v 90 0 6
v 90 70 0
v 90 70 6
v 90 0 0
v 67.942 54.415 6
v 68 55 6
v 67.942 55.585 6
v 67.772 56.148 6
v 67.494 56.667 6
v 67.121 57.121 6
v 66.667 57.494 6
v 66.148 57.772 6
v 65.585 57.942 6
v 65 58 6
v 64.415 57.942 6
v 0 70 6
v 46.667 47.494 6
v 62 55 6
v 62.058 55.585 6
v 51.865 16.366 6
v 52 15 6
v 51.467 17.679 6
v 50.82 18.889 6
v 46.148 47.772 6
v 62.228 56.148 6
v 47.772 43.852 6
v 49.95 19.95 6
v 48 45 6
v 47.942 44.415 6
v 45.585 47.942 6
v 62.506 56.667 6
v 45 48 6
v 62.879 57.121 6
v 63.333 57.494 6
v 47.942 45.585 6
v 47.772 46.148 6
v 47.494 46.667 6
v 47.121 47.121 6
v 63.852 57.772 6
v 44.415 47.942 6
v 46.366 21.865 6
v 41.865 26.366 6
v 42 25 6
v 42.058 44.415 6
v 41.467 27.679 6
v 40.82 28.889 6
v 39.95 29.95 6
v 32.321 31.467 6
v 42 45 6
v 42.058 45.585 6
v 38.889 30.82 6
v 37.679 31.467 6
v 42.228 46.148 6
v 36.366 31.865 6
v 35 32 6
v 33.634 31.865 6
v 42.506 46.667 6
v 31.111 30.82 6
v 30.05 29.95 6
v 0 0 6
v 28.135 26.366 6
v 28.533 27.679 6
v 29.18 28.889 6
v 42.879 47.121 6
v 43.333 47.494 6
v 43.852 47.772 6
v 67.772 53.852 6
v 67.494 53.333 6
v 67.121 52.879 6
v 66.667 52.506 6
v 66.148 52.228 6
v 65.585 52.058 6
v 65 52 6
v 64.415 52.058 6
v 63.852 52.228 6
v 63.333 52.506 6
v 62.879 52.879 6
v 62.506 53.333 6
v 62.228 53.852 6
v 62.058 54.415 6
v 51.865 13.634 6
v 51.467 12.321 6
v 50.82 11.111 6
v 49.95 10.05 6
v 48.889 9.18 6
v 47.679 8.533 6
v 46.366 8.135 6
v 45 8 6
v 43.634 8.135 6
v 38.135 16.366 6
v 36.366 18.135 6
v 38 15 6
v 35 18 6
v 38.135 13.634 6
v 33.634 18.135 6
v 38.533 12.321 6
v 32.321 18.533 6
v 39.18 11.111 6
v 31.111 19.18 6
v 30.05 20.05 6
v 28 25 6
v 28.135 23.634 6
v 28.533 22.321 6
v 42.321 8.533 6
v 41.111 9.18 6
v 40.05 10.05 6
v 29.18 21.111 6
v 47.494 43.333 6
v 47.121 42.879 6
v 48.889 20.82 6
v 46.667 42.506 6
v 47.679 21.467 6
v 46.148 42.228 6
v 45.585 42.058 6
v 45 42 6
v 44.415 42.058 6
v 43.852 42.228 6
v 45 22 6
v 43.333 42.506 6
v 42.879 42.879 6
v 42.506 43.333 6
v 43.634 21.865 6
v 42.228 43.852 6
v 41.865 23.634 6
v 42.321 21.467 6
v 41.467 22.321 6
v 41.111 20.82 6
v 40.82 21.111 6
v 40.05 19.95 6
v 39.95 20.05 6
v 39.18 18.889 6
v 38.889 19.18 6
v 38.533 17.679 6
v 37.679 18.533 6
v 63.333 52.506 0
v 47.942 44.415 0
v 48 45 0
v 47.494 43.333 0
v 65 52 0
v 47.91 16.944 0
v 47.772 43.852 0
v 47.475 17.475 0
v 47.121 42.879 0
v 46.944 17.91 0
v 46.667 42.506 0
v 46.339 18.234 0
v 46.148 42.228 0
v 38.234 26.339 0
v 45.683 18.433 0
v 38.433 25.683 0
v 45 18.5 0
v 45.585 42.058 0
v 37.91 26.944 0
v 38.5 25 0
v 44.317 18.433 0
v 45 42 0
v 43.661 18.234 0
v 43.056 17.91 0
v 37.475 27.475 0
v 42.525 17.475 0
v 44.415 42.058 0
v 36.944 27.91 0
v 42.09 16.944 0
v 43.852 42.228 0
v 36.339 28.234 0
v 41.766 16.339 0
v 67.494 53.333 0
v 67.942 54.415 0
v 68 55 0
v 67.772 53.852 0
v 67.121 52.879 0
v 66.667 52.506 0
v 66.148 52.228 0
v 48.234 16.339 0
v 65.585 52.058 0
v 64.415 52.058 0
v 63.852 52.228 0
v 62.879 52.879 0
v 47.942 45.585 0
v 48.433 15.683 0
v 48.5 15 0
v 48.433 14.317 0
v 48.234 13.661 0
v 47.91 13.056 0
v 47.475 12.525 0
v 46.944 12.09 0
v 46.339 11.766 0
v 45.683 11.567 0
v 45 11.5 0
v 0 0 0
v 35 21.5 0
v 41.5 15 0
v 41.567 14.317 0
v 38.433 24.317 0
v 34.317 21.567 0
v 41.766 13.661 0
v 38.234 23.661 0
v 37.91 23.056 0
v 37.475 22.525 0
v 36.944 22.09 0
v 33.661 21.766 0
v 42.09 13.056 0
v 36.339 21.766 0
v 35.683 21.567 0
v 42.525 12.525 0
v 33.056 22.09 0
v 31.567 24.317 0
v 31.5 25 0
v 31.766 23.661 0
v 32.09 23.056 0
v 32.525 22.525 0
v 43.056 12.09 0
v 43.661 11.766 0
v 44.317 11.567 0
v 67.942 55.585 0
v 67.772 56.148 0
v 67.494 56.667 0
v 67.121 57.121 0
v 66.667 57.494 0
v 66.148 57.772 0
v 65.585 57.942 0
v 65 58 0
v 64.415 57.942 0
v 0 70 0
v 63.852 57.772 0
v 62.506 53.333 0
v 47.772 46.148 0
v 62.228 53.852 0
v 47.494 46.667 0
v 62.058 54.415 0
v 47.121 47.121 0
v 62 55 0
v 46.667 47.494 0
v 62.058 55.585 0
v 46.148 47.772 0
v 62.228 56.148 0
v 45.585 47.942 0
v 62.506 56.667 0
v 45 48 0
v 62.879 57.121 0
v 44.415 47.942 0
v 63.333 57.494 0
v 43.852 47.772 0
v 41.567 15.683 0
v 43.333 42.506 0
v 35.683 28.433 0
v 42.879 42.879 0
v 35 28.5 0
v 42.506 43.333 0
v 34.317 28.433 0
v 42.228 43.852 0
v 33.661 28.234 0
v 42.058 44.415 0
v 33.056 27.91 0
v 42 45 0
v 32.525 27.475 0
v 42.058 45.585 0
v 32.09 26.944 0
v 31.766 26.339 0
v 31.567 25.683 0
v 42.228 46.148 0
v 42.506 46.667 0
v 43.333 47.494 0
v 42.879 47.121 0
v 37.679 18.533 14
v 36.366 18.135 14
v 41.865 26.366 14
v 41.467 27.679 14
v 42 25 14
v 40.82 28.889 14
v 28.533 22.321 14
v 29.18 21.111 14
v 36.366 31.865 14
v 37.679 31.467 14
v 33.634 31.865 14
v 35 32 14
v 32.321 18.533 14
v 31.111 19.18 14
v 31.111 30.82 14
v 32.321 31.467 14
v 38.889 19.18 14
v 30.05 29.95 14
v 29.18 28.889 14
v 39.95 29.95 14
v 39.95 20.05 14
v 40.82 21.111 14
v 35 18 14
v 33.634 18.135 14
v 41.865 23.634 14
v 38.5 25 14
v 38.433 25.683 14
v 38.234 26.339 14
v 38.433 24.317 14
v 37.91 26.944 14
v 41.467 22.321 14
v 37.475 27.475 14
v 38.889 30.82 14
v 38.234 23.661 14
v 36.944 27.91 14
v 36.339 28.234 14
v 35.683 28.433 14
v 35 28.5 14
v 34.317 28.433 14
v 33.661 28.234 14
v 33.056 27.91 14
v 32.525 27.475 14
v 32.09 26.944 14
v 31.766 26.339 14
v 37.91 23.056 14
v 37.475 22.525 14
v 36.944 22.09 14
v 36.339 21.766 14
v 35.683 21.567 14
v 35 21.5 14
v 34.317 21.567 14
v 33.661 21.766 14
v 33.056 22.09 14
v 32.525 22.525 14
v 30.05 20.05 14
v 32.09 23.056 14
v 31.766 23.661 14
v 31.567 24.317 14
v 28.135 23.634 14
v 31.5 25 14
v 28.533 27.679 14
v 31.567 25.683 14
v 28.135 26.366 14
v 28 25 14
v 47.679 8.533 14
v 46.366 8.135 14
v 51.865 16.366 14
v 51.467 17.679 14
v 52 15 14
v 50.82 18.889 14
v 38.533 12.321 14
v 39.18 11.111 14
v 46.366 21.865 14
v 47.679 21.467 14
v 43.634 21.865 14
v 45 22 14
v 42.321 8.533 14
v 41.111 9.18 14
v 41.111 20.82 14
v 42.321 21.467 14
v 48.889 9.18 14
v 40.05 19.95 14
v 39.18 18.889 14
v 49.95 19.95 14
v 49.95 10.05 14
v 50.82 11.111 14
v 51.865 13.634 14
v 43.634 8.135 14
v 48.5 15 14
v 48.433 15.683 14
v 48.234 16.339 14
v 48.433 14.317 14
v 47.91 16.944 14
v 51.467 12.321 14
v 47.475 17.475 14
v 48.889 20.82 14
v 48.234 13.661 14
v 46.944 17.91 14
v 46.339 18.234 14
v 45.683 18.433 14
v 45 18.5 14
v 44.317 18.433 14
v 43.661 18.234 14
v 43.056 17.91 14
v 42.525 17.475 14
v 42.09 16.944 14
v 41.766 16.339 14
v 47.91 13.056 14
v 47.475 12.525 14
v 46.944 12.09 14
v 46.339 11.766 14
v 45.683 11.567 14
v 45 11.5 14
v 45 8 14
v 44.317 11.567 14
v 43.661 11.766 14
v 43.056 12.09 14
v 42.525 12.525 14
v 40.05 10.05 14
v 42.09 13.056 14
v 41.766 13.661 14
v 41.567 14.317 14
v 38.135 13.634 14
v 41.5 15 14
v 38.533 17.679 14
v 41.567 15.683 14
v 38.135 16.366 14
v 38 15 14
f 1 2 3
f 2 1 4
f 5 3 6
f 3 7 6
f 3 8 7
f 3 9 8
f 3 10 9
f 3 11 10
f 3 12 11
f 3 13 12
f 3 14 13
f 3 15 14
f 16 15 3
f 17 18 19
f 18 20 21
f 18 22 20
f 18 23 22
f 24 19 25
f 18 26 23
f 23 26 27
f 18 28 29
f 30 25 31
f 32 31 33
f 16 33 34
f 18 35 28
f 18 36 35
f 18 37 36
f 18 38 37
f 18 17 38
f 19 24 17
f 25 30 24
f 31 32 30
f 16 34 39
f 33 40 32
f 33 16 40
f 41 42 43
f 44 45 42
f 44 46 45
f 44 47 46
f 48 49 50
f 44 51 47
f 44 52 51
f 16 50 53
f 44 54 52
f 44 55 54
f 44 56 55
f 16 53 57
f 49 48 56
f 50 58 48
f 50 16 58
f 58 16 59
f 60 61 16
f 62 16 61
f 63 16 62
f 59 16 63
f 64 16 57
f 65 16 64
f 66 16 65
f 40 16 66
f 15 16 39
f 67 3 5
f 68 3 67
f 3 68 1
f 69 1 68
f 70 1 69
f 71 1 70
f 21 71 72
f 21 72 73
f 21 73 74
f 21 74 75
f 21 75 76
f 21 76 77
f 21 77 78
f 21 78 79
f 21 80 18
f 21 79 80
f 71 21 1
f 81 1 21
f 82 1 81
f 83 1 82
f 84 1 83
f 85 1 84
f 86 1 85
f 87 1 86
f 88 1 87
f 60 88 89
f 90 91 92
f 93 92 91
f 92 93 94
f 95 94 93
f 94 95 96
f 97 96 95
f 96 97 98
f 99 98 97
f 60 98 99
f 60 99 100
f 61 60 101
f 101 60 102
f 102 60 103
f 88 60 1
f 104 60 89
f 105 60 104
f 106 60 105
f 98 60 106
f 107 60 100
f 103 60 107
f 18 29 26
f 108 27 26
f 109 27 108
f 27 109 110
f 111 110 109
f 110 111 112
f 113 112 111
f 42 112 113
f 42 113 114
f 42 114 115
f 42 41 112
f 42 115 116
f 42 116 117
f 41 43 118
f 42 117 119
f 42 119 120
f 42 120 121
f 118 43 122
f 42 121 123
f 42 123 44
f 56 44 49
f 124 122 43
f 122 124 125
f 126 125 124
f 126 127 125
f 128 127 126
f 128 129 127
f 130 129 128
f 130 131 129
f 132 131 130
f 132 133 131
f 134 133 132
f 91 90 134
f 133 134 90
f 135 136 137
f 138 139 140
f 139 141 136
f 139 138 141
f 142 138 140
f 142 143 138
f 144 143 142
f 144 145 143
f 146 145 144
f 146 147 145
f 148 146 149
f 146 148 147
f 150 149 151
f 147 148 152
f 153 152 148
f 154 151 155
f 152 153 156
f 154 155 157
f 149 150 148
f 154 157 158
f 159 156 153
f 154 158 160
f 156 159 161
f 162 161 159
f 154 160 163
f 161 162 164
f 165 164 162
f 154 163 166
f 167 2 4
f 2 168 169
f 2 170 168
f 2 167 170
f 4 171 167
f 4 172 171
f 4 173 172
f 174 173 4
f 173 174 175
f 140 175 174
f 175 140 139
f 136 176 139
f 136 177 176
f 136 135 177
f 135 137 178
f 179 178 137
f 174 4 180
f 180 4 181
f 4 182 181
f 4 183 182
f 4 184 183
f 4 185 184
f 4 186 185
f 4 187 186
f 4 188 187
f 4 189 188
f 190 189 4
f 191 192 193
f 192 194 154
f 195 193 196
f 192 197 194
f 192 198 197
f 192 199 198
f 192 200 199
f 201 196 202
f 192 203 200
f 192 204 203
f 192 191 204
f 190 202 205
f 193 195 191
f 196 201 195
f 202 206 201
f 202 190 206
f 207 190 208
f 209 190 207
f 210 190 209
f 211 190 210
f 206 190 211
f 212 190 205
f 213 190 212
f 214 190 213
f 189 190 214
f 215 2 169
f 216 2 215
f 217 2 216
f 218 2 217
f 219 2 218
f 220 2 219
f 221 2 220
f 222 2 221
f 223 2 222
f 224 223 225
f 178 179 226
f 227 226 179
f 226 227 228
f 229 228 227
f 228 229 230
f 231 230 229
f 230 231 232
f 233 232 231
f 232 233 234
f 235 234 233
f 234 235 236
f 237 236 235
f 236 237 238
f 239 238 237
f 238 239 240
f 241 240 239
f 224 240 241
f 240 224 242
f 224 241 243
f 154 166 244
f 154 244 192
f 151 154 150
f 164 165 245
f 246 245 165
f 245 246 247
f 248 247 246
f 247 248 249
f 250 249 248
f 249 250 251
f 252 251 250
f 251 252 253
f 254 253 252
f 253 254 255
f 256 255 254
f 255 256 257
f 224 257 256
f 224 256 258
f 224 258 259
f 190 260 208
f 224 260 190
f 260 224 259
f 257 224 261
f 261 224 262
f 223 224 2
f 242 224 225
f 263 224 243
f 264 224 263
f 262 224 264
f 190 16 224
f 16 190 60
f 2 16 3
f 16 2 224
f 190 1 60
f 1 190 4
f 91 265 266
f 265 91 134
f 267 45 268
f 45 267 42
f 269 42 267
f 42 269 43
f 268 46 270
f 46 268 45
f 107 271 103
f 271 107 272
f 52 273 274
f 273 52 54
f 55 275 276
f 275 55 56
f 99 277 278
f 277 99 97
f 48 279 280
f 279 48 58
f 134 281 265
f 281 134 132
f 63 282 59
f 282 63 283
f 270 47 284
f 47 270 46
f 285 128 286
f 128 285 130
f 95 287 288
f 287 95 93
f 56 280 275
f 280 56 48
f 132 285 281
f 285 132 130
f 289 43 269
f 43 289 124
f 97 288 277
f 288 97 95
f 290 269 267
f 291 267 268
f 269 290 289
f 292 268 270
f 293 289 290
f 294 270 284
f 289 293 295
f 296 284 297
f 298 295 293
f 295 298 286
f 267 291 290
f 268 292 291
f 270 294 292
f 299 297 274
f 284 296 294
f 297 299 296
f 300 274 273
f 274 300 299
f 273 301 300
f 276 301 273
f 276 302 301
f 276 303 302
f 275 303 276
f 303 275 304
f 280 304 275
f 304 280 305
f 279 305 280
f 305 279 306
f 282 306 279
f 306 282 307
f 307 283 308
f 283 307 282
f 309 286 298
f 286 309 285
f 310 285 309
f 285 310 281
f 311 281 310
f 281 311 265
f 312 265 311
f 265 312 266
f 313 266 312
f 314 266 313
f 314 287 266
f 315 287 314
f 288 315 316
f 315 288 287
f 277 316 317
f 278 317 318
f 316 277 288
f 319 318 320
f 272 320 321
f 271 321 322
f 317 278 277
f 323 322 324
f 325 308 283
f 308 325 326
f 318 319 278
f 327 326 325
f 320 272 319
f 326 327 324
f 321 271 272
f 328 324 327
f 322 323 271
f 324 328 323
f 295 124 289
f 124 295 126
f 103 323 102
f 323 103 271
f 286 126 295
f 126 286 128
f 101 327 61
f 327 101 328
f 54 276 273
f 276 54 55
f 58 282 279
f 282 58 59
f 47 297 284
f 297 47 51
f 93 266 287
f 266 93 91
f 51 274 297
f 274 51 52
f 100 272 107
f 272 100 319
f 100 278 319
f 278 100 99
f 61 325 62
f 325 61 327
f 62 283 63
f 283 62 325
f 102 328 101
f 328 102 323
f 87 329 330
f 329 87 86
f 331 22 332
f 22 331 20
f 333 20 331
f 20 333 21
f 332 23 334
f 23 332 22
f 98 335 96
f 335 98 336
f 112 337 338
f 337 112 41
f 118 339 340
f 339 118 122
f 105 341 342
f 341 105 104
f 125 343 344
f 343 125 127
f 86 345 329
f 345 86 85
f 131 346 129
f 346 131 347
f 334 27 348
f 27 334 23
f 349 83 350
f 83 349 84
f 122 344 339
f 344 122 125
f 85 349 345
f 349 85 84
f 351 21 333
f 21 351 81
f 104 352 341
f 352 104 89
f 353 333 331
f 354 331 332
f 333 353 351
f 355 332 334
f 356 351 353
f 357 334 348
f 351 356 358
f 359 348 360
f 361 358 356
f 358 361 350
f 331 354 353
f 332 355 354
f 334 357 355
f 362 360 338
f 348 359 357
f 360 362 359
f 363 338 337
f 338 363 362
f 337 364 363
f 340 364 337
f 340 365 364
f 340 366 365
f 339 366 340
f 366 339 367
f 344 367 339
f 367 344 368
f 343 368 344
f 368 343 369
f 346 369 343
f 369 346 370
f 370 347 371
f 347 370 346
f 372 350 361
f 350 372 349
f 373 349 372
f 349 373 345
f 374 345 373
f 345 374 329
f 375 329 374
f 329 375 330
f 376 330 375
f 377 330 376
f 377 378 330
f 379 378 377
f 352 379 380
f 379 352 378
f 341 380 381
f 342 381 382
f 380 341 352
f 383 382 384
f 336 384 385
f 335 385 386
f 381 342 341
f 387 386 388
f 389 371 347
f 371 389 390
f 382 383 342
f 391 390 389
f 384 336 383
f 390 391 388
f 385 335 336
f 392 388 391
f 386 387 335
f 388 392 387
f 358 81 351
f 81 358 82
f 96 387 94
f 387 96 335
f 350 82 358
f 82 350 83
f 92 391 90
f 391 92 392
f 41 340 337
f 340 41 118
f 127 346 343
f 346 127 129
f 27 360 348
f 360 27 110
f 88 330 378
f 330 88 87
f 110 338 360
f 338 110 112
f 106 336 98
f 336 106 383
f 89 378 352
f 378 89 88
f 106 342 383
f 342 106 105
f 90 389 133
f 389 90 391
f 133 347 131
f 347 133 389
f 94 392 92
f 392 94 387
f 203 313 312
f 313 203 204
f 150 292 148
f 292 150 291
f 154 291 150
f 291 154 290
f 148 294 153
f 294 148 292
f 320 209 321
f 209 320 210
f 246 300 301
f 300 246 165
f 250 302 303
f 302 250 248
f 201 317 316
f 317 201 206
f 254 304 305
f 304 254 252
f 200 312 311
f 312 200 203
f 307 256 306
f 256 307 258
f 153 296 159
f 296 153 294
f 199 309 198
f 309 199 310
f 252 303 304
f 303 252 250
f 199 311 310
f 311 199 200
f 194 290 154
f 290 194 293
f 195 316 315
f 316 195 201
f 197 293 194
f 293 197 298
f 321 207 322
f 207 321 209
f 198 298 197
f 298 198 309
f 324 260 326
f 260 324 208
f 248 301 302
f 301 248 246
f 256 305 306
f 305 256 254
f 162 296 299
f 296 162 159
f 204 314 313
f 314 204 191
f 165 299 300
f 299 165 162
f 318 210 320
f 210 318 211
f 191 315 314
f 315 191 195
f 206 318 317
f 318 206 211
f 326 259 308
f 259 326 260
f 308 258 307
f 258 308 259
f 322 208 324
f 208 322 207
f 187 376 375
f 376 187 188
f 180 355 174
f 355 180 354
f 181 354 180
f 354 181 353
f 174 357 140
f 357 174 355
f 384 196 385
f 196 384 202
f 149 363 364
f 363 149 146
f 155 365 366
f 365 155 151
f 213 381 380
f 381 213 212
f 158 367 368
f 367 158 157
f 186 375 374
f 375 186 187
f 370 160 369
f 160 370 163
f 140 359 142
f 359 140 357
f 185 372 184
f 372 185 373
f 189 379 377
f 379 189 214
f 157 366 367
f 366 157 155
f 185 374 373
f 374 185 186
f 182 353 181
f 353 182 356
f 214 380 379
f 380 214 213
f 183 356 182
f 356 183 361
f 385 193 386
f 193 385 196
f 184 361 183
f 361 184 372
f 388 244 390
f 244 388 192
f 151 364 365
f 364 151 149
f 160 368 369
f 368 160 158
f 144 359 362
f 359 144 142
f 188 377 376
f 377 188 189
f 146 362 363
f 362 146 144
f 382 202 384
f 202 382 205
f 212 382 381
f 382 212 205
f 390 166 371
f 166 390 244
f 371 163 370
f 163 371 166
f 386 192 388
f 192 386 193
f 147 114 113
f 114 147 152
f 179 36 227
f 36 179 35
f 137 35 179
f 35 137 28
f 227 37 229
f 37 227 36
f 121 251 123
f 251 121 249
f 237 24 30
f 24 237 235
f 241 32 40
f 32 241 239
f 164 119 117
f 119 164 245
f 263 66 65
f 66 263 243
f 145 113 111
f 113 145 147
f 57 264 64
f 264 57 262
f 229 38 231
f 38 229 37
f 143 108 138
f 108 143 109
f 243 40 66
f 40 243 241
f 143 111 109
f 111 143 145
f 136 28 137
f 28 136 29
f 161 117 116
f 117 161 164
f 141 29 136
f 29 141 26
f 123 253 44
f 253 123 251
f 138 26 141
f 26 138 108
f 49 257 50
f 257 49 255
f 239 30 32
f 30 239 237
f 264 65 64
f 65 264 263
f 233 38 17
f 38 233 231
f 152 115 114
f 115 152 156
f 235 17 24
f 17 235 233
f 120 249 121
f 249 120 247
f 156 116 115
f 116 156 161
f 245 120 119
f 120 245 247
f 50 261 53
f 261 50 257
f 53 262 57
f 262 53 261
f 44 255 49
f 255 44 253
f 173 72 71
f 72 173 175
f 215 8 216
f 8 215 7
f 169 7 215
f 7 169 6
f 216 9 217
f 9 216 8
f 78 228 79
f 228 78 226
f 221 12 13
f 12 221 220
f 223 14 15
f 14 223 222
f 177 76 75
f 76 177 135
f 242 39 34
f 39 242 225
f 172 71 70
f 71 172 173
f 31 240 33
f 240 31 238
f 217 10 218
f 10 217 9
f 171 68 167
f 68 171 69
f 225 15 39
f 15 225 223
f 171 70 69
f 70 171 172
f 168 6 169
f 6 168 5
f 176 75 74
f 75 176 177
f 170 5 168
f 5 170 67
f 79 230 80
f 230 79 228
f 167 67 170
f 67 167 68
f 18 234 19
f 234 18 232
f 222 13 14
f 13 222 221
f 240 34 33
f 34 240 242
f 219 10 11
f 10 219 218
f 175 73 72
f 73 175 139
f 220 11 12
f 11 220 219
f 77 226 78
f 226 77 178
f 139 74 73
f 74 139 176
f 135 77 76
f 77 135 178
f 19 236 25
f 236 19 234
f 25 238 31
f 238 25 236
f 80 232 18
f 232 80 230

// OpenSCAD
$fn = 32;

// ----------------------------------------------------------------------
// Mixed field: bosses and holes at given coordinates
// ----------------------------------------------------------------------

// --- parameters (mm) ---
plate_l = 90;             // plate length, X
plate_w = 70;             // plate width, Y
plate_t = 6;              // plate thickness, Z
boss_d = 14;              // boss diameter
boss_h = 8;               // boss height above the plate
hole_d = 6;               // through hole diameter
fit_tol = 0.1;            // tolerance for press fits, mm
free_tol = 0.5;           // tolerance for clearance fits, mm

total_h = plate_t + boss_h;  // overall height

difference() {
  union() {
    cube([plate_l, plate_w, plate_t]);
    translate([35, 25, plate_t]) cylinder(h = boss_h, d = boss_d);
    translate([45, 15, plate_t]) cylinder(h = boss_h, d = boss_d);
  }
  translate([35, 25, -1]) cylinder(h = total_h + 2, d = boss_d / 2);
  translate([45, 15, -1]) cylinder(h = total_h + 2, d = boss_d / 2);
  translate([45, 45, -1]) cylinder(h = plate_t + 2, d = hole_d);
  translate([65, 55, -1]) cylinder(h = plate_t + 2, d = hole_d);
}
